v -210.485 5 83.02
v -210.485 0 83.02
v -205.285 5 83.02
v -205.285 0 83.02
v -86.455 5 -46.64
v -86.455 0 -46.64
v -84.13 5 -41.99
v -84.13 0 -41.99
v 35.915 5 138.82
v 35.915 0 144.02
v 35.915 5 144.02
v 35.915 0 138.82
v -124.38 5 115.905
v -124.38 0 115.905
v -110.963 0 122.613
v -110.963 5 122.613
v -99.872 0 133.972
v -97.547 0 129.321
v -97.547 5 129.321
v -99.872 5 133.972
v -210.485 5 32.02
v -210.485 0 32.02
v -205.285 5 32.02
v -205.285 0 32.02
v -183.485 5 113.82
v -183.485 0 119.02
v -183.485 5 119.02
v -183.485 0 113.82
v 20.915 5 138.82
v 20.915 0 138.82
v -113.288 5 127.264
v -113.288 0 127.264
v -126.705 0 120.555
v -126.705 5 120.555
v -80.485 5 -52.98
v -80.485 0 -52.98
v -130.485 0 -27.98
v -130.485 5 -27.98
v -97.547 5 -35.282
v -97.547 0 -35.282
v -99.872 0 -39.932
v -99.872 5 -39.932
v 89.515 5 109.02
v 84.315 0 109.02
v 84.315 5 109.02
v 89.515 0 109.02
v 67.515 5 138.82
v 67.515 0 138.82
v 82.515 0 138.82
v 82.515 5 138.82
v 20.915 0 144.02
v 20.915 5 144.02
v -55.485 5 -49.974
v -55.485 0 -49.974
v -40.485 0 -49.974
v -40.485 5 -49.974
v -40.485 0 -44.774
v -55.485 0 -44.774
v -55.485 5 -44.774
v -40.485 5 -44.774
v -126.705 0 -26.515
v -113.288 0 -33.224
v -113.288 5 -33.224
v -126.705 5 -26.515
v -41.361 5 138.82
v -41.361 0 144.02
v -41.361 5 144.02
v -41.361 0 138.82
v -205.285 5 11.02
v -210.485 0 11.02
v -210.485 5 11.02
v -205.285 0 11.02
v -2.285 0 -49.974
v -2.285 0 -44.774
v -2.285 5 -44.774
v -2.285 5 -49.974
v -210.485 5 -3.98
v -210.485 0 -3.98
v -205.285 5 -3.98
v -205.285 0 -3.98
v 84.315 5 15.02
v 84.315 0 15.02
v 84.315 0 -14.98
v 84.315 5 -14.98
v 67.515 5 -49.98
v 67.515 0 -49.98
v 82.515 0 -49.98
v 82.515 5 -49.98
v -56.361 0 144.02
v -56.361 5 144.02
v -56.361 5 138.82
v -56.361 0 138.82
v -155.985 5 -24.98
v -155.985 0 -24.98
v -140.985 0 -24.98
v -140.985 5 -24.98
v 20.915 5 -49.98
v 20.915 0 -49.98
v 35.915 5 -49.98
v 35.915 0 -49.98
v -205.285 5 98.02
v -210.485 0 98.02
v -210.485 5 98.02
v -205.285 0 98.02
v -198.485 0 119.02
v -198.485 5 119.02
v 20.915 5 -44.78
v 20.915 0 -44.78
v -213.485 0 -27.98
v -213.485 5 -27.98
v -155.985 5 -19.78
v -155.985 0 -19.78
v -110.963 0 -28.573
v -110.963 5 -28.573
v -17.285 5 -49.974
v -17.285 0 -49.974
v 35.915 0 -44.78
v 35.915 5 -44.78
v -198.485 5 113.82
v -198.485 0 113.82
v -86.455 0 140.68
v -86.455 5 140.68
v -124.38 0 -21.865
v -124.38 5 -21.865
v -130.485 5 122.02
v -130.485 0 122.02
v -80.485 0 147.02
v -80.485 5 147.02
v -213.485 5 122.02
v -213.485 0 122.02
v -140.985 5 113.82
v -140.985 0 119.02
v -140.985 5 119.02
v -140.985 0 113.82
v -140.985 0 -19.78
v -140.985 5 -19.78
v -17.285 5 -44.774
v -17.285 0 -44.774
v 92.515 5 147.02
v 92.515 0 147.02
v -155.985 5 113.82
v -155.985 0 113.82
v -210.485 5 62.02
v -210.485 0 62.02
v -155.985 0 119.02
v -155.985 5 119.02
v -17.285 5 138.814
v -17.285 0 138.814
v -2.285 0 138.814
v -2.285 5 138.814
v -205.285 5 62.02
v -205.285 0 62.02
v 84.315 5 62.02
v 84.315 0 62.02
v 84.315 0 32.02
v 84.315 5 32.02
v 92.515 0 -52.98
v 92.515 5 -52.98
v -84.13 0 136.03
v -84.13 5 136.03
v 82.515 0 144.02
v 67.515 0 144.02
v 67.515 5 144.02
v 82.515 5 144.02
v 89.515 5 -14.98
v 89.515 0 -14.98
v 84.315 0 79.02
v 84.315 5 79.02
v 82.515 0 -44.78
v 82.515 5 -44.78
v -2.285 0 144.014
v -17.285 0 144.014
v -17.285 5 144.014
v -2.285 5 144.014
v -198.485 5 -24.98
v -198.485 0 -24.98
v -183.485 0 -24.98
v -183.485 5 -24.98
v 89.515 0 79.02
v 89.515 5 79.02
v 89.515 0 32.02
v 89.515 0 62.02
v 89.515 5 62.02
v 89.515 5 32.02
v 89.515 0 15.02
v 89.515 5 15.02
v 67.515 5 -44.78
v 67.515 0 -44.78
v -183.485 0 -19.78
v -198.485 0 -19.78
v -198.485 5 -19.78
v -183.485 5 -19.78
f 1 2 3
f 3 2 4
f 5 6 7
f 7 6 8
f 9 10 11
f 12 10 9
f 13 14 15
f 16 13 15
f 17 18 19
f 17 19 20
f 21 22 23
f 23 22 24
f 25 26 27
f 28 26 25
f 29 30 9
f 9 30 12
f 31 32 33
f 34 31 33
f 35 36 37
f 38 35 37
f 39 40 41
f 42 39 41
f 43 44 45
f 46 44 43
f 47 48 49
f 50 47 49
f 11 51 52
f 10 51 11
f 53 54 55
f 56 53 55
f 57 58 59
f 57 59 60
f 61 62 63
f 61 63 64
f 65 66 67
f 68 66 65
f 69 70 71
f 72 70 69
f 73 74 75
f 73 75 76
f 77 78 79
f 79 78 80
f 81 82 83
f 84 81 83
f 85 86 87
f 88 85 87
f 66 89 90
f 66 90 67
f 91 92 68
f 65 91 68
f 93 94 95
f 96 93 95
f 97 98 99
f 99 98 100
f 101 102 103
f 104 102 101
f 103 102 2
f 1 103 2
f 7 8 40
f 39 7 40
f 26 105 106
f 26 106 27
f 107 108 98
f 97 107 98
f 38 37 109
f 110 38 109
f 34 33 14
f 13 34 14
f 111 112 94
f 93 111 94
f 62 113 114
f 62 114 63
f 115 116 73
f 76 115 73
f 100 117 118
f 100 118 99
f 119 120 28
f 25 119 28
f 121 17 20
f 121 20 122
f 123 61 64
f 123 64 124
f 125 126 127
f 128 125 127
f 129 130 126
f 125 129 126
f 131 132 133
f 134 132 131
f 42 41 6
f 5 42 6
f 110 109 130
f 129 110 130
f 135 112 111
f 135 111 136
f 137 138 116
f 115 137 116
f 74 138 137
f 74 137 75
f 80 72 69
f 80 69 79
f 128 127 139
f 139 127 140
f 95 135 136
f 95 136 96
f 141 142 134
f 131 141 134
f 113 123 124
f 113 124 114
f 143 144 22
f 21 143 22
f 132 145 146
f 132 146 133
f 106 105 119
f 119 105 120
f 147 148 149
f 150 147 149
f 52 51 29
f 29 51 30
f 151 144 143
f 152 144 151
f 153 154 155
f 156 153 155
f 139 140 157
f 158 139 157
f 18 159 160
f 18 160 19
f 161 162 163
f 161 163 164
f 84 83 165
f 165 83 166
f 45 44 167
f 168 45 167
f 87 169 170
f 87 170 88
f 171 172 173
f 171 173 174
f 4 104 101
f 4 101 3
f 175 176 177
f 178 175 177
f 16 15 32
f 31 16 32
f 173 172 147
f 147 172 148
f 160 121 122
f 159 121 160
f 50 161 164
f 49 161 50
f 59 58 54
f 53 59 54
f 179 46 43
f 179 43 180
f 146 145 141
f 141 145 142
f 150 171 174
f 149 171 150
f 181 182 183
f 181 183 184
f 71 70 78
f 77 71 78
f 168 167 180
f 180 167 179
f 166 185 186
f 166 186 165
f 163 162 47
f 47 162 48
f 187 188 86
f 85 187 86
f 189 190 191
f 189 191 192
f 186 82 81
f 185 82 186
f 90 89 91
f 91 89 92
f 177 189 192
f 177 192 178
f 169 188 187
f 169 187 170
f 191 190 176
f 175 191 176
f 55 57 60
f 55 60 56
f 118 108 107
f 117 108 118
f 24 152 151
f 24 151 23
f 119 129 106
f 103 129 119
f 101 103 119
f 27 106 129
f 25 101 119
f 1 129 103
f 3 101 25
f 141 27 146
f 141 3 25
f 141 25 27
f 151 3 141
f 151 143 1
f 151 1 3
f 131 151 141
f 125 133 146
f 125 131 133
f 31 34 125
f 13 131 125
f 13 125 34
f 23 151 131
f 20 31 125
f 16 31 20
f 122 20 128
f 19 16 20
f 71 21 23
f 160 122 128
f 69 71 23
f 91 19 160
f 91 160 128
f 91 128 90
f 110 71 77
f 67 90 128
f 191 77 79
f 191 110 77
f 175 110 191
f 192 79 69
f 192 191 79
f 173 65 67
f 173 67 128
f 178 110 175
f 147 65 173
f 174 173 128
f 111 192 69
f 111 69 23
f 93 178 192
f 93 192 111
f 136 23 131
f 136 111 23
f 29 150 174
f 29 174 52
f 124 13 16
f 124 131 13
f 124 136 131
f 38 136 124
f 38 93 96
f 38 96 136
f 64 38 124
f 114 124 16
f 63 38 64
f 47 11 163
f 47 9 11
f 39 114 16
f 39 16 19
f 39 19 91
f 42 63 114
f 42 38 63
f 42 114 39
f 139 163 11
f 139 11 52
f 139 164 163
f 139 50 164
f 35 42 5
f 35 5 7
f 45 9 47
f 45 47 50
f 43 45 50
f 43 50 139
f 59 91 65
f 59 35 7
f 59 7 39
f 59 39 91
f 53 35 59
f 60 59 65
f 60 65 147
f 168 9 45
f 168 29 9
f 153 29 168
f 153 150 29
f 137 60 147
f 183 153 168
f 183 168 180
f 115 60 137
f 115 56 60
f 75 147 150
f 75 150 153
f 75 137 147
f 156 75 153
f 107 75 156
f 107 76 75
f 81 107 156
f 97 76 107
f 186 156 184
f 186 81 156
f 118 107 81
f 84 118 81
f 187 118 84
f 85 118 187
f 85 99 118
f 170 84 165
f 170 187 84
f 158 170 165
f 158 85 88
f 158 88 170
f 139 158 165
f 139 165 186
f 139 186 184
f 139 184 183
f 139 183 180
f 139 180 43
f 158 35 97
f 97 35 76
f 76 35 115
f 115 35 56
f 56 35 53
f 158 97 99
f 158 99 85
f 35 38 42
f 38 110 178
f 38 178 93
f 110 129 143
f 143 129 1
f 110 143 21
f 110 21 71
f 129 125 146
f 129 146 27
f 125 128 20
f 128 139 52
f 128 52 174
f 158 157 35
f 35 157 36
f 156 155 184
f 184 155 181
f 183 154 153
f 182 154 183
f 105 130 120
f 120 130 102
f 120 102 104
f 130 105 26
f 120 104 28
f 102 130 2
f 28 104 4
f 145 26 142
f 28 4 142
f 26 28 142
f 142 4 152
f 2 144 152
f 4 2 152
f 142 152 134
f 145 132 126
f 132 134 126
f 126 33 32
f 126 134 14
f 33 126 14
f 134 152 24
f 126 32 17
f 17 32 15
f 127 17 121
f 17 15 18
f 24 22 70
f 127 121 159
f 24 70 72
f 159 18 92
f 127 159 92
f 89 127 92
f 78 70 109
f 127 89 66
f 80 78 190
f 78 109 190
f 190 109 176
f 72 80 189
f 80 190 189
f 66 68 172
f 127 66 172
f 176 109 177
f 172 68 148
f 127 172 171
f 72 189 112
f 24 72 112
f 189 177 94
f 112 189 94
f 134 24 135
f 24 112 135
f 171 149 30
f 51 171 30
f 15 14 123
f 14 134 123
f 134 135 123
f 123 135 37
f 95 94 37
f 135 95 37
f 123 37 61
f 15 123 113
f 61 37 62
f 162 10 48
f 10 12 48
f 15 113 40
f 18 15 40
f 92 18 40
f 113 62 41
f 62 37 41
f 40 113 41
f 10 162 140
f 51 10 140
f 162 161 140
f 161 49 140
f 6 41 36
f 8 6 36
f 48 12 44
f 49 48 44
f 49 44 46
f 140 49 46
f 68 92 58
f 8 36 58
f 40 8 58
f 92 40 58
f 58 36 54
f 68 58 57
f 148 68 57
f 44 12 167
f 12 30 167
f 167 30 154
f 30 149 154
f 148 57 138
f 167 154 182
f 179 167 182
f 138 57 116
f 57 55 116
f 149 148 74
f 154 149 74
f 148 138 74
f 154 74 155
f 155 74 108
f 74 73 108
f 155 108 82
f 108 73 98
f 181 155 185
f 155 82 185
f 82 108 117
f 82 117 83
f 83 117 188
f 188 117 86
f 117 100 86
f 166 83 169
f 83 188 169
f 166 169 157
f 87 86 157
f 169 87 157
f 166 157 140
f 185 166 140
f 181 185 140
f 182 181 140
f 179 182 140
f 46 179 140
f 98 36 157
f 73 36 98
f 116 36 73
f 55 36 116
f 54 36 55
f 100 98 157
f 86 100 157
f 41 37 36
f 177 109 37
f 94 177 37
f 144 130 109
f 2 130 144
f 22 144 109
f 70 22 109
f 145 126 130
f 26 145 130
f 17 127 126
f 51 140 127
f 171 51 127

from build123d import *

# Parameters (mm, degrees)
SKETCH1_W           = 15
SKETCH1_H           = 5.2
SKETCH1_W_2         = 5.2
SKETCH1_H_2         = 30
SKETCH1_H_3         = 15
BOSS_EXTRUDE1_DEPTH = 5


with BuildPart() as part:
    # Sketch1 → Boss-Extrude1 (new body)
    with BuildSketch(Plane(origin=(0, 0, 0), x_dir=(1, 0, 0), z_dir=(0, 1, 0))):
        Polygon((92.514530464, -147.019914311), (92.514530464, 52.980085689), (-80.485469536, 52.980085689), (-130.485469536, 27.980085689), (-213.485469536, 27.980085689), (-213.485469536, -122.019914311), (-130.485469536, -122.019914311), (-80.485469536, -147.019914311), align=None)
        with Locations((75.014530464, 47.380085689)):
            Rectangle(SKETCH1_W, SKETCH1_H, mode=Mode.SUBTRACT)
        with Locations((75.014530464, -141.419914311)):
            Rectangle(SKETCH1_W, SKETCH1_H, mode=Mode.SUBTRACT)
        with Locations((86.914530464, -0.019914311)):
            Rectangle(SKETCH1_W_2, SKETCH1_H_2, mode=Mode.SUBTRACT)
        with Locations((86.914530464, -47.019914311)):
            Rectangle(SKETCH1_W_2, SKETCH1_H_2, mode=Mode.SUBTRACT)
        with Locations((86.914530464, -94.019914311)):
            Rectangle(SKETCH1_W_2, SKETCH1_H_2, mode=Mode.SUBTRACT)
        with Locations((-9.785469536, 47.373767599)):
            Rectangle(SKETCH1_W, SKETCH1_H, mode=Mode.SUBTRACT)
        with Locations((-47.985469536, 47.373767599)):
            Rectangle(SKETCH1_W, SKETCH1_H, mode=Mode.SUBTRACT)
        with Locations((-148.485469536, 22.380085689)):
            Rectangle(SKETCH1_W, SKETCH1_H, mode=Mode.SUBTRACT)
        with Locations((-190.985469536, 22.380085689)):
            Rectangle(SKETCH1_W, SKETCH1_H, mode=Mode.SUBTRACT)
        with Locations((-207.885469536, -3.519914311)):
            Rectangle(SKETCH1_W_2, SKETCH1_H_3, mode=Mode.SUBTRACT)
        with Locations((-207.885469536, -47.019914311)):
            Rectangle(SKETCH1_W_2, SKETCH1_H_2, mode=Mode.SUBTRACT)
        with Locations((-207.885469536, -90.519914311)):
            Rectangle(SKETCH1_W_2, SKETCH1_H_3, mode=Mode.SUBTRACT)
        with Locations((-48.86060515, -141.420106162)):
            Rectangle(SKETCH1_W, SKETCH1_H, mode=Mode.SUBTRACT)
        with Locations((-148.485469536, -116.419914311)):
            Rectangle(SKETCH1_W, SKETCH1_H, mode=Mode.SUBTRACT)
        with Locations((-190.985469536, -116.419914311)):
            Rectangle(SKETCH1_W, SKETCH1_H, mode=Mode.SUBTRACT)
        with Locations((28.414530464, 47.380085689)):
            Rectangle(SKETCH1_W, SKETCH1_H, mode=Mode.SUBTRACT)
        with Locations((28.414530464, -141.419914311)):
            Rectangle(SKETCH1_W, SKETCH1_H, mode=Mode.SUBTRACT)
        with Locations((-9.785469536, -141.413596222)):
            Rectangle(SKETCH1_W, SKETCH1_H, mode=Mode.SUBTRACT)
        Polygon((-110.963133782, 28.573374858), (-113.288285266, 33.223677824), (-126.704693131, 26.515473891), (-124.379541647, 21.865170925), align=None, mode=Mode.SUBTRACT)
        Polygon((-86.455469536, 46.640085689), (-84.130318052, 41.989782723), (-97.546725917, 35.28157879), (-99.871877401, 39.931881756), align=None, mode=Mode.SUBTRACT)
        Polygon((-99.871877401, -133.971710379), (-86.455469536, -140.679914311), (-84.130318052, -136.029611345), (-97.546725917, -129.321407413), align=None, mode=Mode.SUBTRACT)
        Polygon((-124.379541647, -115.904999548), (-110.963133782, -122.61320348), (-113.288285266, -127.263506446), (-126.704693131, -120.555302514), align=None, mode=Mode.SUBTRACT)
    extrude(amount=BOSS_EXTRUDE1_DEPTH)


solid = part.part
